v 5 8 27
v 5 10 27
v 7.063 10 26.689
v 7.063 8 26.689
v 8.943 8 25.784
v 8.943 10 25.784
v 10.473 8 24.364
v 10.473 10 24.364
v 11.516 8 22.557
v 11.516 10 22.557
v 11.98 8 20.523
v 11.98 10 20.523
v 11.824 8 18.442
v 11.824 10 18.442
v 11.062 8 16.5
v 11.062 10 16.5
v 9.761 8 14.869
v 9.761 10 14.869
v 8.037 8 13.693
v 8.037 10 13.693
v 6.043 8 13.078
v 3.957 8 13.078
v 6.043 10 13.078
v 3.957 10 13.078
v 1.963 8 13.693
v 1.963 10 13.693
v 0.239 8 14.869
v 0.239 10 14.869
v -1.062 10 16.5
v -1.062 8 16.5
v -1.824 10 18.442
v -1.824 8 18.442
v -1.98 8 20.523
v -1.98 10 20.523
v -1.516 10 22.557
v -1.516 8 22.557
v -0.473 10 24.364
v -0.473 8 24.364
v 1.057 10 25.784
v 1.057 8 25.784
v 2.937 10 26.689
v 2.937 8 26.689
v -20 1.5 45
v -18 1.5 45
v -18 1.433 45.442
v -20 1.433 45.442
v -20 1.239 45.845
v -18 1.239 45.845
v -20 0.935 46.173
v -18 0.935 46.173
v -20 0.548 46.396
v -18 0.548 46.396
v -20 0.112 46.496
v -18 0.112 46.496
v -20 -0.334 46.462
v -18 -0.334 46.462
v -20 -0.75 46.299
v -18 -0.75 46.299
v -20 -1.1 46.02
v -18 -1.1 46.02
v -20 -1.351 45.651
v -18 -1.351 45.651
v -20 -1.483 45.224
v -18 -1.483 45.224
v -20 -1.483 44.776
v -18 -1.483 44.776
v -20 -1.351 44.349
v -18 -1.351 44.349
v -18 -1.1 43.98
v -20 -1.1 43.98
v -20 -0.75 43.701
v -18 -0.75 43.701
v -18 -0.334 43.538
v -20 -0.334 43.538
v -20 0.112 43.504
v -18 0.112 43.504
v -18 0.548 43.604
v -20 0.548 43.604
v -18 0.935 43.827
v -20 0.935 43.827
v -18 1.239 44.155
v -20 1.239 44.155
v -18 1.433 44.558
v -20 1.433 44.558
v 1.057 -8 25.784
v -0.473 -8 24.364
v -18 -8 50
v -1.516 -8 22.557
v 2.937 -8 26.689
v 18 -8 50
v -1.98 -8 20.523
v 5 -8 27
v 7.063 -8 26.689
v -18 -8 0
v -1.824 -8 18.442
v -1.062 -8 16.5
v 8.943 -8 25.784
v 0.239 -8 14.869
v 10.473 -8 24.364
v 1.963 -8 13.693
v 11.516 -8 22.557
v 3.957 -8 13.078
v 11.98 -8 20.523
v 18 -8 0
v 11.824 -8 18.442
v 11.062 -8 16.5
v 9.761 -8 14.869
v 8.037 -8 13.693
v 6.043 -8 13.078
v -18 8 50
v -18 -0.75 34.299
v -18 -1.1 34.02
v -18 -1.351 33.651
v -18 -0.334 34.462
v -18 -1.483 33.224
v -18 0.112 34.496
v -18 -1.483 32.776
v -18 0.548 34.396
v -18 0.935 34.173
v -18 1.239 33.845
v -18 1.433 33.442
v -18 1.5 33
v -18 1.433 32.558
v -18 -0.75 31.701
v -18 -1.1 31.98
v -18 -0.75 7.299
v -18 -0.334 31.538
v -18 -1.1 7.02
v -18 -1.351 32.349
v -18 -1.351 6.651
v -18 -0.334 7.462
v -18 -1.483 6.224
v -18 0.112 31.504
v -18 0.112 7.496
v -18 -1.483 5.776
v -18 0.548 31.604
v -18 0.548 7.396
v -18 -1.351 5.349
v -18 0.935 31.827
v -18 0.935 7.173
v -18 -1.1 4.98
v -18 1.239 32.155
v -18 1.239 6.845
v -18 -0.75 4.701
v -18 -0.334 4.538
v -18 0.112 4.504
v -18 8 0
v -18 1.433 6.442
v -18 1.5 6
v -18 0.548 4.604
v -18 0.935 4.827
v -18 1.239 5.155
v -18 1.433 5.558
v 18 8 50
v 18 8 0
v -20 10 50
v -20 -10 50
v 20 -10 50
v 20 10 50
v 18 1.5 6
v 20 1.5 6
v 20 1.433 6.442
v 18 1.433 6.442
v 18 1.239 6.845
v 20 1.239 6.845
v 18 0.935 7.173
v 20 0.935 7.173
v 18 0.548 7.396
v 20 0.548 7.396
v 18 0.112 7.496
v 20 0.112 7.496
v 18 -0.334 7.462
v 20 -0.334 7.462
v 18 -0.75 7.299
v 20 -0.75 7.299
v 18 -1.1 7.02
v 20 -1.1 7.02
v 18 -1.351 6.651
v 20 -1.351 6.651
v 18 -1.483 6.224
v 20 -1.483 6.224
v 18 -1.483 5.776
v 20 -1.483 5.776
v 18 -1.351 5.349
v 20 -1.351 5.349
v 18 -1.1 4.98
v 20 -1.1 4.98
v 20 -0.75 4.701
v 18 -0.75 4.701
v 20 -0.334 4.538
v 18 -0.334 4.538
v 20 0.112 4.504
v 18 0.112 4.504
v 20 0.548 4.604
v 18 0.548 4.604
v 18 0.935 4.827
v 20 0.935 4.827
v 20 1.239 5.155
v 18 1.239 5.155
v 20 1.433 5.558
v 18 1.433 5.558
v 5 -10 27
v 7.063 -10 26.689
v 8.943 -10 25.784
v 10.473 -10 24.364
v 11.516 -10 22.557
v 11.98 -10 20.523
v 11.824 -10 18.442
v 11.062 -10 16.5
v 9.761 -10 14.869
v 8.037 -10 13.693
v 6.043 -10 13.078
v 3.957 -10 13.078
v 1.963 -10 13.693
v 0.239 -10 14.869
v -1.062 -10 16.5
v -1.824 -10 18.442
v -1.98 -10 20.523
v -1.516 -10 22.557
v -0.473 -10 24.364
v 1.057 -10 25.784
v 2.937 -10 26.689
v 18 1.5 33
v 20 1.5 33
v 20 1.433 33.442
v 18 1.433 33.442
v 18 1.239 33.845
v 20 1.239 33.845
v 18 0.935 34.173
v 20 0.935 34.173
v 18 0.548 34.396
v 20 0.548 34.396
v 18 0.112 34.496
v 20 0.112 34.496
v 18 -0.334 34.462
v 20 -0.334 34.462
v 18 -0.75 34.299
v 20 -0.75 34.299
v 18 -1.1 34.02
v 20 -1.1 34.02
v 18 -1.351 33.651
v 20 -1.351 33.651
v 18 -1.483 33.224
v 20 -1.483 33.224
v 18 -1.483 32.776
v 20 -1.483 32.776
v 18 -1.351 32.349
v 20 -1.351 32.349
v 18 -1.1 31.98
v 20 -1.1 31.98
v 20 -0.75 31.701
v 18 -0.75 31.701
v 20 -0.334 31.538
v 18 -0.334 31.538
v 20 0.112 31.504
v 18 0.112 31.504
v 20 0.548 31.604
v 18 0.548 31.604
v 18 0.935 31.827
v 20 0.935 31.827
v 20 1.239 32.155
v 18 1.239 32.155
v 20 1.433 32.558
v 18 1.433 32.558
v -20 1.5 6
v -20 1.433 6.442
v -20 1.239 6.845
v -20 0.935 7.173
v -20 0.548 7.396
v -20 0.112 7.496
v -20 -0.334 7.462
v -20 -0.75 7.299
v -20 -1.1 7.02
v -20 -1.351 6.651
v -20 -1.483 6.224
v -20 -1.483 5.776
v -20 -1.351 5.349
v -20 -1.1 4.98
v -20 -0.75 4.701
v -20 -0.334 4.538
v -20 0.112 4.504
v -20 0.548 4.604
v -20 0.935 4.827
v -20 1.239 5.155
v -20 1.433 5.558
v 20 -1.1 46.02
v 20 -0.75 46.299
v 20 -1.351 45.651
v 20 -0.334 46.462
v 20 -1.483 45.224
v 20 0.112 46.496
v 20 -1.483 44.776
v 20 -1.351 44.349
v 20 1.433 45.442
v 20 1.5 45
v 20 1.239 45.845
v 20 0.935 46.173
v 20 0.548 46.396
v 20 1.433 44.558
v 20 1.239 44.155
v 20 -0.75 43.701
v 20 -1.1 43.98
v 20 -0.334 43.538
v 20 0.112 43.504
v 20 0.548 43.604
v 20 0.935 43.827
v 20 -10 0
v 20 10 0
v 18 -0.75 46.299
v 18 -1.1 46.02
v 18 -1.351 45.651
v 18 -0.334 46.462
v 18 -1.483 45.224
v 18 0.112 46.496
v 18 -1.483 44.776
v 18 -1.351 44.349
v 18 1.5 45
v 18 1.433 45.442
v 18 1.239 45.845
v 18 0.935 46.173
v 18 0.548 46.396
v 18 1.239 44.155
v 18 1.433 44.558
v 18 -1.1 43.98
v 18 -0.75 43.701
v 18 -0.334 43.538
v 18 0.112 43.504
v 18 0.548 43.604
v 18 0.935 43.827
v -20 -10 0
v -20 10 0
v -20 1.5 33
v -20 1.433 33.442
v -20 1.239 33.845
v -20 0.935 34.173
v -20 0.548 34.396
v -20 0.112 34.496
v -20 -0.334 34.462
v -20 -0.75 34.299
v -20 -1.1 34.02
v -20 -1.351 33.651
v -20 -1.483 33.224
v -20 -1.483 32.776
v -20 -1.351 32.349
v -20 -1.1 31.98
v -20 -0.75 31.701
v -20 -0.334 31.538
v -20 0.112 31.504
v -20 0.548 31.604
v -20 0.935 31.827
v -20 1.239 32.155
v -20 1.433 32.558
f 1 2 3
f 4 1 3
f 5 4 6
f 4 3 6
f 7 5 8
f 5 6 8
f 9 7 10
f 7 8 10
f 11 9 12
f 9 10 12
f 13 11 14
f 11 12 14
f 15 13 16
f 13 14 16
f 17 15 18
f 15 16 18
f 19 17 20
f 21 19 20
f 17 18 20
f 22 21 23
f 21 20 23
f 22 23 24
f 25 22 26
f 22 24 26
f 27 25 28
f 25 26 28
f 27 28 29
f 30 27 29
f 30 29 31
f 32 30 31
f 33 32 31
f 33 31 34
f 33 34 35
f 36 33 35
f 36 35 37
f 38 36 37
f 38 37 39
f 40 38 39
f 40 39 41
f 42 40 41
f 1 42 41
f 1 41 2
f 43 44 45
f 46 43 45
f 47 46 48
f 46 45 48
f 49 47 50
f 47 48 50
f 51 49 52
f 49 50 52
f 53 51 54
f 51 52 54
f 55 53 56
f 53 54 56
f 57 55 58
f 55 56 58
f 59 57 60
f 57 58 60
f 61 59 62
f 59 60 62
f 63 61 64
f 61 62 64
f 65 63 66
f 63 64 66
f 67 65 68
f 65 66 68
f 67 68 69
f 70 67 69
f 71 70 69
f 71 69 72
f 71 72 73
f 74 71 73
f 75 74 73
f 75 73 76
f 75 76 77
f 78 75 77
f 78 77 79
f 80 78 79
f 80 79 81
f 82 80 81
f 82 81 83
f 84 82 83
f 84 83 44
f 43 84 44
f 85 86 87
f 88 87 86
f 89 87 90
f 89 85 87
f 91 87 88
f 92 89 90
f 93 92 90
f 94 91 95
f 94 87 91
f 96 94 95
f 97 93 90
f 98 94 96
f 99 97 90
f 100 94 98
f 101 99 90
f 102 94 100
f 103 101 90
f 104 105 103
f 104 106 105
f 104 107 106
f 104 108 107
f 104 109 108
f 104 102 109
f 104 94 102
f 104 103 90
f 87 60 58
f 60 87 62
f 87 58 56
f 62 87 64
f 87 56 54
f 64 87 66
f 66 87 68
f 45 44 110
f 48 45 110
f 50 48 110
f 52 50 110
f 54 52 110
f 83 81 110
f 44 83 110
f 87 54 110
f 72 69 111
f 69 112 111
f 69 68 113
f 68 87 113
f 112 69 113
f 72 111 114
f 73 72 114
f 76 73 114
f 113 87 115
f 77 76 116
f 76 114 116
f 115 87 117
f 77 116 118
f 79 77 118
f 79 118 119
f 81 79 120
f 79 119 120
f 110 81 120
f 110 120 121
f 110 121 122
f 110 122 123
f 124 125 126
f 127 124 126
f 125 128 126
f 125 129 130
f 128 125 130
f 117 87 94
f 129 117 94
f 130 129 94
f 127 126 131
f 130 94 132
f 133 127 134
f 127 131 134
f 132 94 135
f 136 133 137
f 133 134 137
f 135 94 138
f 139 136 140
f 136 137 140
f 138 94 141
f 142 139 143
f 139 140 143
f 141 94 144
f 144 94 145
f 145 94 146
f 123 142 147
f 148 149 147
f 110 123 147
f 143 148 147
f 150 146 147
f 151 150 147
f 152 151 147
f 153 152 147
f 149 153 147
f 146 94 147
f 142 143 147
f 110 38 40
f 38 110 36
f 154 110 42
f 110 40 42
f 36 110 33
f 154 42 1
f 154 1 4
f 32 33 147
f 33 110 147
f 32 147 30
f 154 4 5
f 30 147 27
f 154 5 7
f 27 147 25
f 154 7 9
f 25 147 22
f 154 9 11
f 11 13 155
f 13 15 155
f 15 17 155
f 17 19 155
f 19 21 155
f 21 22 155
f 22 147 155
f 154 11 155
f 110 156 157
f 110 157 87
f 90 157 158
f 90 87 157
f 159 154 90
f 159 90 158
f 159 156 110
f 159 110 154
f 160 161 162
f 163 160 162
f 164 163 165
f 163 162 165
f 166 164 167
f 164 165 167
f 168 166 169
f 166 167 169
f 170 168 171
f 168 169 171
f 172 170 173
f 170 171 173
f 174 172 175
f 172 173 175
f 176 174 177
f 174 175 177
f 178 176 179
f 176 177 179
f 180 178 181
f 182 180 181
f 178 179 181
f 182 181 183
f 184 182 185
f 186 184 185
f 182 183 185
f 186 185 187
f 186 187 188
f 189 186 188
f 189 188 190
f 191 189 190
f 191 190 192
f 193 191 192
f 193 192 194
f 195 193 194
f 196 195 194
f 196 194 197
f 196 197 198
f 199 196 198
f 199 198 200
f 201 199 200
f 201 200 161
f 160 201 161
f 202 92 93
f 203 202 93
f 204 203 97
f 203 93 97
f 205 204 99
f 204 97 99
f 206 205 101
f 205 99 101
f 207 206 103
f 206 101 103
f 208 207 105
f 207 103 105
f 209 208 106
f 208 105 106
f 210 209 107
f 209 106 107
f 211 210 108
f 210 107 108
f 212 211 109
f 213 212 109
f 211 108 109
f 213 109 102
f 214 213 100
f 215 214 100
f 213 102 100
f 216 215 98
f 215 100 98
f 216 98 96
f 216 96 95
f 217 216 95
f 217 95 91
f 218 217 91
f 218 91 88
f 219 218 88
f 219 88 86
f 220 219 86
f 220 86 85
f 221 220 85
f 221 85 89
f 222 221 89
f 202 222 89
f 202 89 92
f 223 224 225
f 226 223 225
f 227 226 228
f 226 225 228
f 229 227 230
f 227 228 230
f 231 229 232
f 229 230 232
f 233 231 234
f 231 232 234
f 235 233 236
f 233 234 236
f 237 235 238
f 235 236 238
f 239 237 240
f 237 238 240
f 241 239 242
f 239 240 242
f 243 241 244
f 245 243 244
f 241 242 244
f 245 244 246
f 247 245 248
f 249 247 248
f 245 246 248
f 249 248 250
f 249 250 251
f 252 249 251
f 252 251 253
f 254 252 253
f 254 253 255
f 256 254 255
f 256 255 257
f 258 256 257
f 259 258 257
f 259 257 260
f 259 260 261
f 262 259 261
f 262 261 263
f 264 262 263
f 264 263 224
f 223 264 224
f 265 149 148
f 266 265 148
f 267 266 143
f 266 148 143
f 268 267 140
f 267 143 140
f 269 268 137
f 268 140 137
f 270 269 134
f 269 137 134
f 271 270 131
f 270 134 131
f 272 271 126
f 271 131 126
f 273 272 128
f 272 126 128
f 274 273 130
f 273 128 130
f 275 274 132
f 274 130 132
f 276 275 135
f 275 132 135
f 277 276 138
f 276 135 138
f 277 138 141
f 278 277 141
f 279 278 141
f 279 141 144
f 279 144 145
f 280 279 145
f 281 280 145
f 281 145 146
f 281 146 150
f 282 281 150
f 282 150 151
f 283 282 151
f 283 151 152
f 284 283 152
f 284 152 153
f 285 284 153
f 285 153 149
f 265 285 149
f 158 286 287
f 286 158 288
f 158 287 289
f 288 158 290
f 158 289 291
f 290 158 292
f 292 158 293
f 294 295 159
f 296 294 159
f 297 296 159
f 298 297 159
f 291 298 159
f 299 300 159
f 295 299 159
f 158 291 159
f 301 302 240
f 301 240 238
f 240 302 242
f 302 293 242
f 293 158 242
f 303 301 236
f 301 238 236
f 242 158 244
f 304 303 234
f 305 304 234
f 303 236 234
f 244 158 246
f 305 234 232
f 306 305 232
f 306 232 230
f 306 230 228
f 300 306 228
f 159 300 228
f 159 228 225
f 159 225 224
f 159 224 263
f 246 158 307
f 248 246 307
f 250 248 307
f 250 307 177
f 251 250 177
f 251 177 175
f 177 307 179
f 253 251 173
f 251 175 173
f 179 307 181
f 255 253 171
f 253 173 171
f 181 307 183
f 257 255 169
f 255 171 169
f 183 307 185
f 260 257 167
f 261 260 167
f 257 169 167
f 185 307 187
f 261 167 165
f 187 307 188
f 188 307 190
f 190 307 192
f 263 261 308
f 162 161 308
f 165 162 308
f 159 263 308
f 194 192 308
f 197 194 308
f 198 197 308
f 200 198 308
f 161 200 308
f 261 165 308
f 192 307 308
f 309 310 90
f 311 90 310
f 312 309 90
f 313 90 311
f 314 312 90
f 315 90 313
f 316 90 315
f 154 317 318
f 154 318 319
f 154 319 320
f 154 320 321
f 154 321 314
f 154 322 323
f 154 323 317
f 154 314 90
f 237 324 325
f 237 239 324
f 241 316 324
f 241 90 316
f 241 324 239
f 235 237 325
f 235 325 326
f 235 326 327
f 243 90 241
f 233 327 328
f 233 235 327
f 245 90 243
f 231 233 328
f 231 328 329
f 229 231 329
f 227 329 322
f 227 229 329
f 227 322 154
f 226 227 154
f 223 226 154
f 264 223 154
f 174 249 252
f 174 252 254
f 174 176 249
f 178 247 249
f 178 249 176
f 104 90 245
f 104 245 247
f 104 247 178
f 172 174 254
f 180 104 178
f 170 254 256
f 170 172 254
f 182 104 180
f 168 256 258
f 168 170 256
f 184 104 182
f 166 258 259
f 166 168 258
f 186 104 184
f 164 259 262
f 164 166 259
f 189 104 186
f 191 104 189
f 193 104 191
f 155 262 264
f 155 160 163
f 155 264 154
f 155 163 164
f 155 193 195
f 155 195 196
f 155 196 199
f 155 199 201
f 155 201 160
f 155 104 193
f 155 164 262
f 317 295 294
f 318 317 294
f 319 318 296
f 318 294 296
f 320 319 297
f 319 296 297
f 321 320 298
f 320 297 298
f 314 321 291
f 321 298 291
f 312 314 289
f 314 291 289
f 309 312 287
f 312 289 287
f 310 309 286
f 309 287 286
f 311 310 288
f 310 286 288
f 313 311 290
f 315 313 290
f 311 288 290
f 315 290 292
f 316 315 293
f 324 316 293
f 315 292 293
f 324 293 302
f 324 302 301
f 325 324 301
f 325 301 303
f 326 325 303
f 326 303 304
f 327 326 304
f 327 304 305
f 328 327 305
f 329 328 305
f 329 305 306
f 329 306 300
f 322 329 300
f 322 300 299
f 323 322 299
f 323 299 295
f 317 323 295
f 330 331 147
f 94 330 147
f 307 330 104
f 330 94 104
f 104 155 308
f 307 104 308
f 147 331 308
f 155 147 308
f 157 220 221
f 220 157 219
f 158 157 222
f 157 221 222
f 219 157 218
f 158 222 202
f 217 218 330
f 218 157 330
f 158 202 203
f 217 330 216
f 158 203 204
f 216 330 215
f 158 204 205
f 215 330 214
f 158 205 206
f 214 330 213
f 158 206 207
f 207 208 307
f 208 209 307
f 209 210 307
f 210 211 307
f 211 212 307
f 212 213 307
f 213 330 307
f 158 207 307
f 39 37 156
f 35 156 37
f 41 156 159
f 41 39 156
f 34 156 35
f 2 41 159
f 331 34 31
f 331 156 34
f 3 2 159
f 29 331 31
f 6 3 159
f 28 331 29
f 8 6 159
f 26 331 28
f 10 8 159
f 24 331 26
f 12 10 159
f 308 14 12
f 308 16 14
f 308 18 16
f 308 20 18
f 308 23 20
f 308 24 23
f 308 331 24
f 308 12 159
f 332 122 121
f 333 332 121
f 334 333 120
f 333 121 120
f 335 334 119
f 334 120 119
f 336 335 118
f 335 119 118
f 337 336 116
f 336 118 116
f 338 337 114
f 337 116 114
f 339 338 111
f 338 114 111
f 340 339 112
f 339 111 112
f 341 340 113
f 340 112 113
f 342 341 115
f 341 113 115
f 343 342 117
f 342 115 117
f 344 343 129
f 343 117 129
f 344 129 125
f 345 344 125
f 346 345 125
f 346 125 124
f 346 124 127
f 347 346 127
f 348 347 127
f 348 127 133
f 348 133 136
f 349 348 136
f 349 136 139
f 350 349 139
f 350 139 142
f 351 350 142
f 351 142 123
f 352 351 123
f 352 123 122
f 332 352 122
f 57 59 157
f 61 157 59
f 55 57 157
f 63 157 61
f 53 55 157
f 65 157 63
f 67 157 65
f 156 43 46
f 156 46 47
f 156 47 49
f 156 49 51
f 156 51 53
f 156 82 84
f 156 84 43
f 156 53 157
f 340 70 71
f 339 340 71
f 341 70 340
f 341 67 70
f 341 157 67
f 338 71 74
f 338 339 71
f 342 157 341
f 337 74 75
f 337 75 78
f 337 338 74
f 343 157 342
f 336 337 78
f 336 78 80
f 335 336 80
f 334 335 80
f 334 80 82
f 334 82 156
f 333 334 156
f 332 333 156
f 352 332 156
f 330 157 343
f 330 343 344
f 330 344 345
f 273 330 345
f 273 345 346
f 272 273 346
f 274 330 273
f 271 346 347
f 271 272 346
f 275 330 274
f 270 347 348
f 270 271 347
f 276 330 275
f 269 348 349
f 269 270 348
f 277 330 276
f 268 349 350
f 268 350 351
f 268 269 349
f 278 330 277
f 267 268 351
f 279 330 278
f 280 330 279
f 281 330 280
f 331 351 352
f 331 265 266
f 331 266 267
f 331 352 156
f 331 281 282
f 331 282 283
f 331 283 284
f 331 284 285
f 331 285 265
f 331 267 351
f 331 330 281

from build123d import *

# Parameters (mm, degrees)
SKETCH_1_W          = 40
SKETCH_1_H          = 20
SKETCH_1_W_2        = 36
SKETCH_1_H_2        = 16
EXTRUDE_1_DEPTH     = 50
SKETCH_2_R          = 7
CUT_EXTRUDE_1_DEPTH = 20
SKETCH_3_R          = 1.5
CUT_EXTRUDE_2_DEPTH = 50


with BuildPart() as part:
    # 草图1 → 凸台-拉伸1 (new body)
    with BuildSketch(Plane.XY):
        Rectangle(SKETCH_1_W, SKETCH_1_H)
        Rectangle(SKETCH_1_W_2, SKETCH_1_H_2, mode=Mode.SUBTRACT)
    extrude(amount=EXTRUDE_1_DEPTH)

    # 草图2 → 切除-拉伸1 (cut)
    with BuildSketch(Plane(origin=(0, 10, 0), x_dir=(1, 0, 0), z_dir=(0, 1, 0))):
        with Locations(Location((5, -20, 0), (0, 0, 270))):
            Circle(SKETCH_2_R)
    extrude(amount=-CUT_EXTRUDE_1_DEPTH, mode=Mode.SUBTRACT)

    # 草图3 → 切除-拉伸2 (cut)
    with BuildSketch(Plane(origin=(20, 0, 0), x_dir=(0, 0, -1), z_dir=(1, 0, 0))):
        with Locations(Location((-6, 0, 0), (0, 0, 90))):
            Circle(SKETCH_3_R)
        with Locations(Location((-33, 0, 0), (0, 0, 90))):
            Circle(SKETCH_3_R)
        with Locations(Location((-45, 0, 0), (0, 0, 90))):
            Circle(SKETCH_3_R)
    extrude(amount=-CUT_EXTRUDE_2_DEPTH, mode=Mode.SUBTRACT)


solid = part.part
